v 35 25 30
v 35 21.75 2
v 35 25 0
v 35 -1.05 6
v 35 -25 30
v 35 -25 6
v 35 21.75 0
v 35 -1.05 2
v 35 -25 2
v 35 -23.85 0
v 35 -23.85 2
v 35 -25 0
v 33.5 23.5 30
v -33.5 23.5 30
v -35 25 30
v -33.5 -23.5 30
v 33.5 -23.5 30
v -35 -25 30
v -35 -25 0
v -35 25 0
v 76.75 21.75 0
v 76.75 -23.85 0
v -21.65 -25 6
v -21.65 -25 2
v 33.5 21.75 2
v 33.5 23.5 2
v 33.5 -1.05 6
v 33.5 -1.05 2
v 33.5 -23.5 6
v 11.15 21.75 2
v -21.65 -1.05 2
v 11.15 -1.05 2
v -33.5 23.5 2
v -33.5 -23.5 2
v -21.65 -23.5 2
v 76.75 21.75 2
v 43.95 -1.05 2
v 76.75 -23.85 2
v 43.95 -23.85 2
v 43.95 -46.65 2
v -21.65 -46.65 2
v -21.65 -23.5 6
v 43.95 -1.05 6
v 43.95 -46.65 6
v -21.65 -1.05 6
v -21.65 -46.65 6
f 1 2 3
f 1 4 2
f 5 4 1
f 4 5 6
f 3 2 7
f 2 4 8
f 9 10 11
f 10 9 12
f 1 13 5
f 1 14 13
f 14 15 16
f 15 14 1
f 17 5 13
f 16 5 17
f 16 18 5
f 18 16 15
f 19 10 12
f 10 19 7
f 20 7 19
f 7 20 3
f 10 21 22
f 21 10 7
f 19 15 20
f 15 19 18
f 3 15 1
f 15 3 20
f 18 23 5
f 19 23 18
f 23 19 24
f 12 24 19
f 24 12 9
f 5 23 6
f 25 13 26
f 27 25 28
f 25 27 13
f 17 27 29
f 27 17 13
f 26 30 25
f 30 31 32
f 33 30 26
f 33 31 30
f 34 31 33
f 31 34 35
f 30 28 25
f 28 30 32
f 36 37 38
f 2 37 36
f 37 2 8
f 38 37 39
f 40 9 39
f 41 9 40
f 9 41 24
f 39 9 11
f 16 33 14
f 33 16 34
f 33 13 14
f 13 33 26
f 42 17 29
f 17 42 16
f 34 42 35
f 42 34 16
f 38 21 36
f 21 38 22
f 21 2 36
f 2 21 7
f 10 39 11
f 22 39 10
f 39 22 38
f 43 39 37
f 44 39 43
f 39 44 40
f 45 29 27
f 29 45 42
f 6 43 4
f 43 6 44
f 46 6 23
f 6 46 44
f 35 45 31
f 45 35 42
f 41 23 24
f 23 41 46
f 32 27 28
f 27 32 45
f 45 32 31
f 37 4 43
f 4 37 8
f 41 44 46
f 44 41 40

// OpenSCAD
// Two-part enclosure for small electronics board (e.g., Arduino-based logger)
// Print orientation: both parts on the bed, lid on the +X side of the box,
// with a 10 mm gap between them. The lid is printed upside down so its lip
// hangs into the box opening.

// ---------------- Parameters ----------------
box_x      = 70;    // box outer size in X (mm)
box_y      = 50;    // box outer size in Y (mm)
box_z      = 30;    // box outer size in Z (mm)
box_wall   = 2;     // box wall thickness (mm)
box_floor  = 2;     // box floor thickness (mm)

lip_w      = 65.6;  // lid lip outer size in X (mm)
lip_y      = 45.6;  // lid lip outer size in Y (mm)
lip_t      = 1.5;   // lid lip thickness (mm)
lip_h      = 4;     // lid lip height / wall above plate (mm)

eps        = 0.2;   // clearance between lip and box opening (mm)
gap        = 10;    // gap between box and lid on the bed (mm)
plate_t    = 2;     // lid plate thickness (mm)

overcut    = 0.5;   // extra length on cutting shapes past faces (mm)

$fn = 32;

// ---------------- Derived ----------------
box_inner_x = box_x - 2 * box_wall;   // 66 mm
box_inner_y = box_y - 2 * box_wall;   // 46 mm
// Lip overall size includes the overcut wall on each side:
// wall thickness (lip_t) + clearance (eps) + inner dimension
lip_over_x  = lip_t + eps + box_inner_x;  // 73.0 mm
lip_over_y  = lip_t + eps + box_inner_y;  // 48.0 mm

// ---------------- Modules ----------------
module box() {
    // Open-top box: full outer cube, cut out the interior up to the top face.
    // The floor (box_floor) and side walls (box_wall) remain.
    difference() {
        translate([-box_x / 2, -box_y / 2, 0])
            cube([box_x, box_y, box_z]);
        translate([-box_inner_x / 2 - overcut, -box_inner_y / 2 - overcut, box_floor])
            cube([box_inner_x + 2 * overcut,
                  box_inner_y + 2 * overcut,
                  box_z - box_floor + overcut]);
    }
}

module lid() {
    // Plate with a rectangular lip on top, centred on the plate.
    // Printed upside down: plate on the bed, lip hanging into the box.
    translate([-lip_over_x / 2, -lip_over_y / 2, 0])
        union() {
            // Base plate
            cube([lip_w, lip_y, plate_t]);
            // Lip: wall from plate top up to lip_h
            translate([-lip_w / 2, -lip_y / 2, plate_t])
                cube([lip_w, lip_y, lip_h]);
        }
}

// ---------------- Assembly ----------------
box();
translate([box_x / 2 + gap, 0, 0])
    lid();
